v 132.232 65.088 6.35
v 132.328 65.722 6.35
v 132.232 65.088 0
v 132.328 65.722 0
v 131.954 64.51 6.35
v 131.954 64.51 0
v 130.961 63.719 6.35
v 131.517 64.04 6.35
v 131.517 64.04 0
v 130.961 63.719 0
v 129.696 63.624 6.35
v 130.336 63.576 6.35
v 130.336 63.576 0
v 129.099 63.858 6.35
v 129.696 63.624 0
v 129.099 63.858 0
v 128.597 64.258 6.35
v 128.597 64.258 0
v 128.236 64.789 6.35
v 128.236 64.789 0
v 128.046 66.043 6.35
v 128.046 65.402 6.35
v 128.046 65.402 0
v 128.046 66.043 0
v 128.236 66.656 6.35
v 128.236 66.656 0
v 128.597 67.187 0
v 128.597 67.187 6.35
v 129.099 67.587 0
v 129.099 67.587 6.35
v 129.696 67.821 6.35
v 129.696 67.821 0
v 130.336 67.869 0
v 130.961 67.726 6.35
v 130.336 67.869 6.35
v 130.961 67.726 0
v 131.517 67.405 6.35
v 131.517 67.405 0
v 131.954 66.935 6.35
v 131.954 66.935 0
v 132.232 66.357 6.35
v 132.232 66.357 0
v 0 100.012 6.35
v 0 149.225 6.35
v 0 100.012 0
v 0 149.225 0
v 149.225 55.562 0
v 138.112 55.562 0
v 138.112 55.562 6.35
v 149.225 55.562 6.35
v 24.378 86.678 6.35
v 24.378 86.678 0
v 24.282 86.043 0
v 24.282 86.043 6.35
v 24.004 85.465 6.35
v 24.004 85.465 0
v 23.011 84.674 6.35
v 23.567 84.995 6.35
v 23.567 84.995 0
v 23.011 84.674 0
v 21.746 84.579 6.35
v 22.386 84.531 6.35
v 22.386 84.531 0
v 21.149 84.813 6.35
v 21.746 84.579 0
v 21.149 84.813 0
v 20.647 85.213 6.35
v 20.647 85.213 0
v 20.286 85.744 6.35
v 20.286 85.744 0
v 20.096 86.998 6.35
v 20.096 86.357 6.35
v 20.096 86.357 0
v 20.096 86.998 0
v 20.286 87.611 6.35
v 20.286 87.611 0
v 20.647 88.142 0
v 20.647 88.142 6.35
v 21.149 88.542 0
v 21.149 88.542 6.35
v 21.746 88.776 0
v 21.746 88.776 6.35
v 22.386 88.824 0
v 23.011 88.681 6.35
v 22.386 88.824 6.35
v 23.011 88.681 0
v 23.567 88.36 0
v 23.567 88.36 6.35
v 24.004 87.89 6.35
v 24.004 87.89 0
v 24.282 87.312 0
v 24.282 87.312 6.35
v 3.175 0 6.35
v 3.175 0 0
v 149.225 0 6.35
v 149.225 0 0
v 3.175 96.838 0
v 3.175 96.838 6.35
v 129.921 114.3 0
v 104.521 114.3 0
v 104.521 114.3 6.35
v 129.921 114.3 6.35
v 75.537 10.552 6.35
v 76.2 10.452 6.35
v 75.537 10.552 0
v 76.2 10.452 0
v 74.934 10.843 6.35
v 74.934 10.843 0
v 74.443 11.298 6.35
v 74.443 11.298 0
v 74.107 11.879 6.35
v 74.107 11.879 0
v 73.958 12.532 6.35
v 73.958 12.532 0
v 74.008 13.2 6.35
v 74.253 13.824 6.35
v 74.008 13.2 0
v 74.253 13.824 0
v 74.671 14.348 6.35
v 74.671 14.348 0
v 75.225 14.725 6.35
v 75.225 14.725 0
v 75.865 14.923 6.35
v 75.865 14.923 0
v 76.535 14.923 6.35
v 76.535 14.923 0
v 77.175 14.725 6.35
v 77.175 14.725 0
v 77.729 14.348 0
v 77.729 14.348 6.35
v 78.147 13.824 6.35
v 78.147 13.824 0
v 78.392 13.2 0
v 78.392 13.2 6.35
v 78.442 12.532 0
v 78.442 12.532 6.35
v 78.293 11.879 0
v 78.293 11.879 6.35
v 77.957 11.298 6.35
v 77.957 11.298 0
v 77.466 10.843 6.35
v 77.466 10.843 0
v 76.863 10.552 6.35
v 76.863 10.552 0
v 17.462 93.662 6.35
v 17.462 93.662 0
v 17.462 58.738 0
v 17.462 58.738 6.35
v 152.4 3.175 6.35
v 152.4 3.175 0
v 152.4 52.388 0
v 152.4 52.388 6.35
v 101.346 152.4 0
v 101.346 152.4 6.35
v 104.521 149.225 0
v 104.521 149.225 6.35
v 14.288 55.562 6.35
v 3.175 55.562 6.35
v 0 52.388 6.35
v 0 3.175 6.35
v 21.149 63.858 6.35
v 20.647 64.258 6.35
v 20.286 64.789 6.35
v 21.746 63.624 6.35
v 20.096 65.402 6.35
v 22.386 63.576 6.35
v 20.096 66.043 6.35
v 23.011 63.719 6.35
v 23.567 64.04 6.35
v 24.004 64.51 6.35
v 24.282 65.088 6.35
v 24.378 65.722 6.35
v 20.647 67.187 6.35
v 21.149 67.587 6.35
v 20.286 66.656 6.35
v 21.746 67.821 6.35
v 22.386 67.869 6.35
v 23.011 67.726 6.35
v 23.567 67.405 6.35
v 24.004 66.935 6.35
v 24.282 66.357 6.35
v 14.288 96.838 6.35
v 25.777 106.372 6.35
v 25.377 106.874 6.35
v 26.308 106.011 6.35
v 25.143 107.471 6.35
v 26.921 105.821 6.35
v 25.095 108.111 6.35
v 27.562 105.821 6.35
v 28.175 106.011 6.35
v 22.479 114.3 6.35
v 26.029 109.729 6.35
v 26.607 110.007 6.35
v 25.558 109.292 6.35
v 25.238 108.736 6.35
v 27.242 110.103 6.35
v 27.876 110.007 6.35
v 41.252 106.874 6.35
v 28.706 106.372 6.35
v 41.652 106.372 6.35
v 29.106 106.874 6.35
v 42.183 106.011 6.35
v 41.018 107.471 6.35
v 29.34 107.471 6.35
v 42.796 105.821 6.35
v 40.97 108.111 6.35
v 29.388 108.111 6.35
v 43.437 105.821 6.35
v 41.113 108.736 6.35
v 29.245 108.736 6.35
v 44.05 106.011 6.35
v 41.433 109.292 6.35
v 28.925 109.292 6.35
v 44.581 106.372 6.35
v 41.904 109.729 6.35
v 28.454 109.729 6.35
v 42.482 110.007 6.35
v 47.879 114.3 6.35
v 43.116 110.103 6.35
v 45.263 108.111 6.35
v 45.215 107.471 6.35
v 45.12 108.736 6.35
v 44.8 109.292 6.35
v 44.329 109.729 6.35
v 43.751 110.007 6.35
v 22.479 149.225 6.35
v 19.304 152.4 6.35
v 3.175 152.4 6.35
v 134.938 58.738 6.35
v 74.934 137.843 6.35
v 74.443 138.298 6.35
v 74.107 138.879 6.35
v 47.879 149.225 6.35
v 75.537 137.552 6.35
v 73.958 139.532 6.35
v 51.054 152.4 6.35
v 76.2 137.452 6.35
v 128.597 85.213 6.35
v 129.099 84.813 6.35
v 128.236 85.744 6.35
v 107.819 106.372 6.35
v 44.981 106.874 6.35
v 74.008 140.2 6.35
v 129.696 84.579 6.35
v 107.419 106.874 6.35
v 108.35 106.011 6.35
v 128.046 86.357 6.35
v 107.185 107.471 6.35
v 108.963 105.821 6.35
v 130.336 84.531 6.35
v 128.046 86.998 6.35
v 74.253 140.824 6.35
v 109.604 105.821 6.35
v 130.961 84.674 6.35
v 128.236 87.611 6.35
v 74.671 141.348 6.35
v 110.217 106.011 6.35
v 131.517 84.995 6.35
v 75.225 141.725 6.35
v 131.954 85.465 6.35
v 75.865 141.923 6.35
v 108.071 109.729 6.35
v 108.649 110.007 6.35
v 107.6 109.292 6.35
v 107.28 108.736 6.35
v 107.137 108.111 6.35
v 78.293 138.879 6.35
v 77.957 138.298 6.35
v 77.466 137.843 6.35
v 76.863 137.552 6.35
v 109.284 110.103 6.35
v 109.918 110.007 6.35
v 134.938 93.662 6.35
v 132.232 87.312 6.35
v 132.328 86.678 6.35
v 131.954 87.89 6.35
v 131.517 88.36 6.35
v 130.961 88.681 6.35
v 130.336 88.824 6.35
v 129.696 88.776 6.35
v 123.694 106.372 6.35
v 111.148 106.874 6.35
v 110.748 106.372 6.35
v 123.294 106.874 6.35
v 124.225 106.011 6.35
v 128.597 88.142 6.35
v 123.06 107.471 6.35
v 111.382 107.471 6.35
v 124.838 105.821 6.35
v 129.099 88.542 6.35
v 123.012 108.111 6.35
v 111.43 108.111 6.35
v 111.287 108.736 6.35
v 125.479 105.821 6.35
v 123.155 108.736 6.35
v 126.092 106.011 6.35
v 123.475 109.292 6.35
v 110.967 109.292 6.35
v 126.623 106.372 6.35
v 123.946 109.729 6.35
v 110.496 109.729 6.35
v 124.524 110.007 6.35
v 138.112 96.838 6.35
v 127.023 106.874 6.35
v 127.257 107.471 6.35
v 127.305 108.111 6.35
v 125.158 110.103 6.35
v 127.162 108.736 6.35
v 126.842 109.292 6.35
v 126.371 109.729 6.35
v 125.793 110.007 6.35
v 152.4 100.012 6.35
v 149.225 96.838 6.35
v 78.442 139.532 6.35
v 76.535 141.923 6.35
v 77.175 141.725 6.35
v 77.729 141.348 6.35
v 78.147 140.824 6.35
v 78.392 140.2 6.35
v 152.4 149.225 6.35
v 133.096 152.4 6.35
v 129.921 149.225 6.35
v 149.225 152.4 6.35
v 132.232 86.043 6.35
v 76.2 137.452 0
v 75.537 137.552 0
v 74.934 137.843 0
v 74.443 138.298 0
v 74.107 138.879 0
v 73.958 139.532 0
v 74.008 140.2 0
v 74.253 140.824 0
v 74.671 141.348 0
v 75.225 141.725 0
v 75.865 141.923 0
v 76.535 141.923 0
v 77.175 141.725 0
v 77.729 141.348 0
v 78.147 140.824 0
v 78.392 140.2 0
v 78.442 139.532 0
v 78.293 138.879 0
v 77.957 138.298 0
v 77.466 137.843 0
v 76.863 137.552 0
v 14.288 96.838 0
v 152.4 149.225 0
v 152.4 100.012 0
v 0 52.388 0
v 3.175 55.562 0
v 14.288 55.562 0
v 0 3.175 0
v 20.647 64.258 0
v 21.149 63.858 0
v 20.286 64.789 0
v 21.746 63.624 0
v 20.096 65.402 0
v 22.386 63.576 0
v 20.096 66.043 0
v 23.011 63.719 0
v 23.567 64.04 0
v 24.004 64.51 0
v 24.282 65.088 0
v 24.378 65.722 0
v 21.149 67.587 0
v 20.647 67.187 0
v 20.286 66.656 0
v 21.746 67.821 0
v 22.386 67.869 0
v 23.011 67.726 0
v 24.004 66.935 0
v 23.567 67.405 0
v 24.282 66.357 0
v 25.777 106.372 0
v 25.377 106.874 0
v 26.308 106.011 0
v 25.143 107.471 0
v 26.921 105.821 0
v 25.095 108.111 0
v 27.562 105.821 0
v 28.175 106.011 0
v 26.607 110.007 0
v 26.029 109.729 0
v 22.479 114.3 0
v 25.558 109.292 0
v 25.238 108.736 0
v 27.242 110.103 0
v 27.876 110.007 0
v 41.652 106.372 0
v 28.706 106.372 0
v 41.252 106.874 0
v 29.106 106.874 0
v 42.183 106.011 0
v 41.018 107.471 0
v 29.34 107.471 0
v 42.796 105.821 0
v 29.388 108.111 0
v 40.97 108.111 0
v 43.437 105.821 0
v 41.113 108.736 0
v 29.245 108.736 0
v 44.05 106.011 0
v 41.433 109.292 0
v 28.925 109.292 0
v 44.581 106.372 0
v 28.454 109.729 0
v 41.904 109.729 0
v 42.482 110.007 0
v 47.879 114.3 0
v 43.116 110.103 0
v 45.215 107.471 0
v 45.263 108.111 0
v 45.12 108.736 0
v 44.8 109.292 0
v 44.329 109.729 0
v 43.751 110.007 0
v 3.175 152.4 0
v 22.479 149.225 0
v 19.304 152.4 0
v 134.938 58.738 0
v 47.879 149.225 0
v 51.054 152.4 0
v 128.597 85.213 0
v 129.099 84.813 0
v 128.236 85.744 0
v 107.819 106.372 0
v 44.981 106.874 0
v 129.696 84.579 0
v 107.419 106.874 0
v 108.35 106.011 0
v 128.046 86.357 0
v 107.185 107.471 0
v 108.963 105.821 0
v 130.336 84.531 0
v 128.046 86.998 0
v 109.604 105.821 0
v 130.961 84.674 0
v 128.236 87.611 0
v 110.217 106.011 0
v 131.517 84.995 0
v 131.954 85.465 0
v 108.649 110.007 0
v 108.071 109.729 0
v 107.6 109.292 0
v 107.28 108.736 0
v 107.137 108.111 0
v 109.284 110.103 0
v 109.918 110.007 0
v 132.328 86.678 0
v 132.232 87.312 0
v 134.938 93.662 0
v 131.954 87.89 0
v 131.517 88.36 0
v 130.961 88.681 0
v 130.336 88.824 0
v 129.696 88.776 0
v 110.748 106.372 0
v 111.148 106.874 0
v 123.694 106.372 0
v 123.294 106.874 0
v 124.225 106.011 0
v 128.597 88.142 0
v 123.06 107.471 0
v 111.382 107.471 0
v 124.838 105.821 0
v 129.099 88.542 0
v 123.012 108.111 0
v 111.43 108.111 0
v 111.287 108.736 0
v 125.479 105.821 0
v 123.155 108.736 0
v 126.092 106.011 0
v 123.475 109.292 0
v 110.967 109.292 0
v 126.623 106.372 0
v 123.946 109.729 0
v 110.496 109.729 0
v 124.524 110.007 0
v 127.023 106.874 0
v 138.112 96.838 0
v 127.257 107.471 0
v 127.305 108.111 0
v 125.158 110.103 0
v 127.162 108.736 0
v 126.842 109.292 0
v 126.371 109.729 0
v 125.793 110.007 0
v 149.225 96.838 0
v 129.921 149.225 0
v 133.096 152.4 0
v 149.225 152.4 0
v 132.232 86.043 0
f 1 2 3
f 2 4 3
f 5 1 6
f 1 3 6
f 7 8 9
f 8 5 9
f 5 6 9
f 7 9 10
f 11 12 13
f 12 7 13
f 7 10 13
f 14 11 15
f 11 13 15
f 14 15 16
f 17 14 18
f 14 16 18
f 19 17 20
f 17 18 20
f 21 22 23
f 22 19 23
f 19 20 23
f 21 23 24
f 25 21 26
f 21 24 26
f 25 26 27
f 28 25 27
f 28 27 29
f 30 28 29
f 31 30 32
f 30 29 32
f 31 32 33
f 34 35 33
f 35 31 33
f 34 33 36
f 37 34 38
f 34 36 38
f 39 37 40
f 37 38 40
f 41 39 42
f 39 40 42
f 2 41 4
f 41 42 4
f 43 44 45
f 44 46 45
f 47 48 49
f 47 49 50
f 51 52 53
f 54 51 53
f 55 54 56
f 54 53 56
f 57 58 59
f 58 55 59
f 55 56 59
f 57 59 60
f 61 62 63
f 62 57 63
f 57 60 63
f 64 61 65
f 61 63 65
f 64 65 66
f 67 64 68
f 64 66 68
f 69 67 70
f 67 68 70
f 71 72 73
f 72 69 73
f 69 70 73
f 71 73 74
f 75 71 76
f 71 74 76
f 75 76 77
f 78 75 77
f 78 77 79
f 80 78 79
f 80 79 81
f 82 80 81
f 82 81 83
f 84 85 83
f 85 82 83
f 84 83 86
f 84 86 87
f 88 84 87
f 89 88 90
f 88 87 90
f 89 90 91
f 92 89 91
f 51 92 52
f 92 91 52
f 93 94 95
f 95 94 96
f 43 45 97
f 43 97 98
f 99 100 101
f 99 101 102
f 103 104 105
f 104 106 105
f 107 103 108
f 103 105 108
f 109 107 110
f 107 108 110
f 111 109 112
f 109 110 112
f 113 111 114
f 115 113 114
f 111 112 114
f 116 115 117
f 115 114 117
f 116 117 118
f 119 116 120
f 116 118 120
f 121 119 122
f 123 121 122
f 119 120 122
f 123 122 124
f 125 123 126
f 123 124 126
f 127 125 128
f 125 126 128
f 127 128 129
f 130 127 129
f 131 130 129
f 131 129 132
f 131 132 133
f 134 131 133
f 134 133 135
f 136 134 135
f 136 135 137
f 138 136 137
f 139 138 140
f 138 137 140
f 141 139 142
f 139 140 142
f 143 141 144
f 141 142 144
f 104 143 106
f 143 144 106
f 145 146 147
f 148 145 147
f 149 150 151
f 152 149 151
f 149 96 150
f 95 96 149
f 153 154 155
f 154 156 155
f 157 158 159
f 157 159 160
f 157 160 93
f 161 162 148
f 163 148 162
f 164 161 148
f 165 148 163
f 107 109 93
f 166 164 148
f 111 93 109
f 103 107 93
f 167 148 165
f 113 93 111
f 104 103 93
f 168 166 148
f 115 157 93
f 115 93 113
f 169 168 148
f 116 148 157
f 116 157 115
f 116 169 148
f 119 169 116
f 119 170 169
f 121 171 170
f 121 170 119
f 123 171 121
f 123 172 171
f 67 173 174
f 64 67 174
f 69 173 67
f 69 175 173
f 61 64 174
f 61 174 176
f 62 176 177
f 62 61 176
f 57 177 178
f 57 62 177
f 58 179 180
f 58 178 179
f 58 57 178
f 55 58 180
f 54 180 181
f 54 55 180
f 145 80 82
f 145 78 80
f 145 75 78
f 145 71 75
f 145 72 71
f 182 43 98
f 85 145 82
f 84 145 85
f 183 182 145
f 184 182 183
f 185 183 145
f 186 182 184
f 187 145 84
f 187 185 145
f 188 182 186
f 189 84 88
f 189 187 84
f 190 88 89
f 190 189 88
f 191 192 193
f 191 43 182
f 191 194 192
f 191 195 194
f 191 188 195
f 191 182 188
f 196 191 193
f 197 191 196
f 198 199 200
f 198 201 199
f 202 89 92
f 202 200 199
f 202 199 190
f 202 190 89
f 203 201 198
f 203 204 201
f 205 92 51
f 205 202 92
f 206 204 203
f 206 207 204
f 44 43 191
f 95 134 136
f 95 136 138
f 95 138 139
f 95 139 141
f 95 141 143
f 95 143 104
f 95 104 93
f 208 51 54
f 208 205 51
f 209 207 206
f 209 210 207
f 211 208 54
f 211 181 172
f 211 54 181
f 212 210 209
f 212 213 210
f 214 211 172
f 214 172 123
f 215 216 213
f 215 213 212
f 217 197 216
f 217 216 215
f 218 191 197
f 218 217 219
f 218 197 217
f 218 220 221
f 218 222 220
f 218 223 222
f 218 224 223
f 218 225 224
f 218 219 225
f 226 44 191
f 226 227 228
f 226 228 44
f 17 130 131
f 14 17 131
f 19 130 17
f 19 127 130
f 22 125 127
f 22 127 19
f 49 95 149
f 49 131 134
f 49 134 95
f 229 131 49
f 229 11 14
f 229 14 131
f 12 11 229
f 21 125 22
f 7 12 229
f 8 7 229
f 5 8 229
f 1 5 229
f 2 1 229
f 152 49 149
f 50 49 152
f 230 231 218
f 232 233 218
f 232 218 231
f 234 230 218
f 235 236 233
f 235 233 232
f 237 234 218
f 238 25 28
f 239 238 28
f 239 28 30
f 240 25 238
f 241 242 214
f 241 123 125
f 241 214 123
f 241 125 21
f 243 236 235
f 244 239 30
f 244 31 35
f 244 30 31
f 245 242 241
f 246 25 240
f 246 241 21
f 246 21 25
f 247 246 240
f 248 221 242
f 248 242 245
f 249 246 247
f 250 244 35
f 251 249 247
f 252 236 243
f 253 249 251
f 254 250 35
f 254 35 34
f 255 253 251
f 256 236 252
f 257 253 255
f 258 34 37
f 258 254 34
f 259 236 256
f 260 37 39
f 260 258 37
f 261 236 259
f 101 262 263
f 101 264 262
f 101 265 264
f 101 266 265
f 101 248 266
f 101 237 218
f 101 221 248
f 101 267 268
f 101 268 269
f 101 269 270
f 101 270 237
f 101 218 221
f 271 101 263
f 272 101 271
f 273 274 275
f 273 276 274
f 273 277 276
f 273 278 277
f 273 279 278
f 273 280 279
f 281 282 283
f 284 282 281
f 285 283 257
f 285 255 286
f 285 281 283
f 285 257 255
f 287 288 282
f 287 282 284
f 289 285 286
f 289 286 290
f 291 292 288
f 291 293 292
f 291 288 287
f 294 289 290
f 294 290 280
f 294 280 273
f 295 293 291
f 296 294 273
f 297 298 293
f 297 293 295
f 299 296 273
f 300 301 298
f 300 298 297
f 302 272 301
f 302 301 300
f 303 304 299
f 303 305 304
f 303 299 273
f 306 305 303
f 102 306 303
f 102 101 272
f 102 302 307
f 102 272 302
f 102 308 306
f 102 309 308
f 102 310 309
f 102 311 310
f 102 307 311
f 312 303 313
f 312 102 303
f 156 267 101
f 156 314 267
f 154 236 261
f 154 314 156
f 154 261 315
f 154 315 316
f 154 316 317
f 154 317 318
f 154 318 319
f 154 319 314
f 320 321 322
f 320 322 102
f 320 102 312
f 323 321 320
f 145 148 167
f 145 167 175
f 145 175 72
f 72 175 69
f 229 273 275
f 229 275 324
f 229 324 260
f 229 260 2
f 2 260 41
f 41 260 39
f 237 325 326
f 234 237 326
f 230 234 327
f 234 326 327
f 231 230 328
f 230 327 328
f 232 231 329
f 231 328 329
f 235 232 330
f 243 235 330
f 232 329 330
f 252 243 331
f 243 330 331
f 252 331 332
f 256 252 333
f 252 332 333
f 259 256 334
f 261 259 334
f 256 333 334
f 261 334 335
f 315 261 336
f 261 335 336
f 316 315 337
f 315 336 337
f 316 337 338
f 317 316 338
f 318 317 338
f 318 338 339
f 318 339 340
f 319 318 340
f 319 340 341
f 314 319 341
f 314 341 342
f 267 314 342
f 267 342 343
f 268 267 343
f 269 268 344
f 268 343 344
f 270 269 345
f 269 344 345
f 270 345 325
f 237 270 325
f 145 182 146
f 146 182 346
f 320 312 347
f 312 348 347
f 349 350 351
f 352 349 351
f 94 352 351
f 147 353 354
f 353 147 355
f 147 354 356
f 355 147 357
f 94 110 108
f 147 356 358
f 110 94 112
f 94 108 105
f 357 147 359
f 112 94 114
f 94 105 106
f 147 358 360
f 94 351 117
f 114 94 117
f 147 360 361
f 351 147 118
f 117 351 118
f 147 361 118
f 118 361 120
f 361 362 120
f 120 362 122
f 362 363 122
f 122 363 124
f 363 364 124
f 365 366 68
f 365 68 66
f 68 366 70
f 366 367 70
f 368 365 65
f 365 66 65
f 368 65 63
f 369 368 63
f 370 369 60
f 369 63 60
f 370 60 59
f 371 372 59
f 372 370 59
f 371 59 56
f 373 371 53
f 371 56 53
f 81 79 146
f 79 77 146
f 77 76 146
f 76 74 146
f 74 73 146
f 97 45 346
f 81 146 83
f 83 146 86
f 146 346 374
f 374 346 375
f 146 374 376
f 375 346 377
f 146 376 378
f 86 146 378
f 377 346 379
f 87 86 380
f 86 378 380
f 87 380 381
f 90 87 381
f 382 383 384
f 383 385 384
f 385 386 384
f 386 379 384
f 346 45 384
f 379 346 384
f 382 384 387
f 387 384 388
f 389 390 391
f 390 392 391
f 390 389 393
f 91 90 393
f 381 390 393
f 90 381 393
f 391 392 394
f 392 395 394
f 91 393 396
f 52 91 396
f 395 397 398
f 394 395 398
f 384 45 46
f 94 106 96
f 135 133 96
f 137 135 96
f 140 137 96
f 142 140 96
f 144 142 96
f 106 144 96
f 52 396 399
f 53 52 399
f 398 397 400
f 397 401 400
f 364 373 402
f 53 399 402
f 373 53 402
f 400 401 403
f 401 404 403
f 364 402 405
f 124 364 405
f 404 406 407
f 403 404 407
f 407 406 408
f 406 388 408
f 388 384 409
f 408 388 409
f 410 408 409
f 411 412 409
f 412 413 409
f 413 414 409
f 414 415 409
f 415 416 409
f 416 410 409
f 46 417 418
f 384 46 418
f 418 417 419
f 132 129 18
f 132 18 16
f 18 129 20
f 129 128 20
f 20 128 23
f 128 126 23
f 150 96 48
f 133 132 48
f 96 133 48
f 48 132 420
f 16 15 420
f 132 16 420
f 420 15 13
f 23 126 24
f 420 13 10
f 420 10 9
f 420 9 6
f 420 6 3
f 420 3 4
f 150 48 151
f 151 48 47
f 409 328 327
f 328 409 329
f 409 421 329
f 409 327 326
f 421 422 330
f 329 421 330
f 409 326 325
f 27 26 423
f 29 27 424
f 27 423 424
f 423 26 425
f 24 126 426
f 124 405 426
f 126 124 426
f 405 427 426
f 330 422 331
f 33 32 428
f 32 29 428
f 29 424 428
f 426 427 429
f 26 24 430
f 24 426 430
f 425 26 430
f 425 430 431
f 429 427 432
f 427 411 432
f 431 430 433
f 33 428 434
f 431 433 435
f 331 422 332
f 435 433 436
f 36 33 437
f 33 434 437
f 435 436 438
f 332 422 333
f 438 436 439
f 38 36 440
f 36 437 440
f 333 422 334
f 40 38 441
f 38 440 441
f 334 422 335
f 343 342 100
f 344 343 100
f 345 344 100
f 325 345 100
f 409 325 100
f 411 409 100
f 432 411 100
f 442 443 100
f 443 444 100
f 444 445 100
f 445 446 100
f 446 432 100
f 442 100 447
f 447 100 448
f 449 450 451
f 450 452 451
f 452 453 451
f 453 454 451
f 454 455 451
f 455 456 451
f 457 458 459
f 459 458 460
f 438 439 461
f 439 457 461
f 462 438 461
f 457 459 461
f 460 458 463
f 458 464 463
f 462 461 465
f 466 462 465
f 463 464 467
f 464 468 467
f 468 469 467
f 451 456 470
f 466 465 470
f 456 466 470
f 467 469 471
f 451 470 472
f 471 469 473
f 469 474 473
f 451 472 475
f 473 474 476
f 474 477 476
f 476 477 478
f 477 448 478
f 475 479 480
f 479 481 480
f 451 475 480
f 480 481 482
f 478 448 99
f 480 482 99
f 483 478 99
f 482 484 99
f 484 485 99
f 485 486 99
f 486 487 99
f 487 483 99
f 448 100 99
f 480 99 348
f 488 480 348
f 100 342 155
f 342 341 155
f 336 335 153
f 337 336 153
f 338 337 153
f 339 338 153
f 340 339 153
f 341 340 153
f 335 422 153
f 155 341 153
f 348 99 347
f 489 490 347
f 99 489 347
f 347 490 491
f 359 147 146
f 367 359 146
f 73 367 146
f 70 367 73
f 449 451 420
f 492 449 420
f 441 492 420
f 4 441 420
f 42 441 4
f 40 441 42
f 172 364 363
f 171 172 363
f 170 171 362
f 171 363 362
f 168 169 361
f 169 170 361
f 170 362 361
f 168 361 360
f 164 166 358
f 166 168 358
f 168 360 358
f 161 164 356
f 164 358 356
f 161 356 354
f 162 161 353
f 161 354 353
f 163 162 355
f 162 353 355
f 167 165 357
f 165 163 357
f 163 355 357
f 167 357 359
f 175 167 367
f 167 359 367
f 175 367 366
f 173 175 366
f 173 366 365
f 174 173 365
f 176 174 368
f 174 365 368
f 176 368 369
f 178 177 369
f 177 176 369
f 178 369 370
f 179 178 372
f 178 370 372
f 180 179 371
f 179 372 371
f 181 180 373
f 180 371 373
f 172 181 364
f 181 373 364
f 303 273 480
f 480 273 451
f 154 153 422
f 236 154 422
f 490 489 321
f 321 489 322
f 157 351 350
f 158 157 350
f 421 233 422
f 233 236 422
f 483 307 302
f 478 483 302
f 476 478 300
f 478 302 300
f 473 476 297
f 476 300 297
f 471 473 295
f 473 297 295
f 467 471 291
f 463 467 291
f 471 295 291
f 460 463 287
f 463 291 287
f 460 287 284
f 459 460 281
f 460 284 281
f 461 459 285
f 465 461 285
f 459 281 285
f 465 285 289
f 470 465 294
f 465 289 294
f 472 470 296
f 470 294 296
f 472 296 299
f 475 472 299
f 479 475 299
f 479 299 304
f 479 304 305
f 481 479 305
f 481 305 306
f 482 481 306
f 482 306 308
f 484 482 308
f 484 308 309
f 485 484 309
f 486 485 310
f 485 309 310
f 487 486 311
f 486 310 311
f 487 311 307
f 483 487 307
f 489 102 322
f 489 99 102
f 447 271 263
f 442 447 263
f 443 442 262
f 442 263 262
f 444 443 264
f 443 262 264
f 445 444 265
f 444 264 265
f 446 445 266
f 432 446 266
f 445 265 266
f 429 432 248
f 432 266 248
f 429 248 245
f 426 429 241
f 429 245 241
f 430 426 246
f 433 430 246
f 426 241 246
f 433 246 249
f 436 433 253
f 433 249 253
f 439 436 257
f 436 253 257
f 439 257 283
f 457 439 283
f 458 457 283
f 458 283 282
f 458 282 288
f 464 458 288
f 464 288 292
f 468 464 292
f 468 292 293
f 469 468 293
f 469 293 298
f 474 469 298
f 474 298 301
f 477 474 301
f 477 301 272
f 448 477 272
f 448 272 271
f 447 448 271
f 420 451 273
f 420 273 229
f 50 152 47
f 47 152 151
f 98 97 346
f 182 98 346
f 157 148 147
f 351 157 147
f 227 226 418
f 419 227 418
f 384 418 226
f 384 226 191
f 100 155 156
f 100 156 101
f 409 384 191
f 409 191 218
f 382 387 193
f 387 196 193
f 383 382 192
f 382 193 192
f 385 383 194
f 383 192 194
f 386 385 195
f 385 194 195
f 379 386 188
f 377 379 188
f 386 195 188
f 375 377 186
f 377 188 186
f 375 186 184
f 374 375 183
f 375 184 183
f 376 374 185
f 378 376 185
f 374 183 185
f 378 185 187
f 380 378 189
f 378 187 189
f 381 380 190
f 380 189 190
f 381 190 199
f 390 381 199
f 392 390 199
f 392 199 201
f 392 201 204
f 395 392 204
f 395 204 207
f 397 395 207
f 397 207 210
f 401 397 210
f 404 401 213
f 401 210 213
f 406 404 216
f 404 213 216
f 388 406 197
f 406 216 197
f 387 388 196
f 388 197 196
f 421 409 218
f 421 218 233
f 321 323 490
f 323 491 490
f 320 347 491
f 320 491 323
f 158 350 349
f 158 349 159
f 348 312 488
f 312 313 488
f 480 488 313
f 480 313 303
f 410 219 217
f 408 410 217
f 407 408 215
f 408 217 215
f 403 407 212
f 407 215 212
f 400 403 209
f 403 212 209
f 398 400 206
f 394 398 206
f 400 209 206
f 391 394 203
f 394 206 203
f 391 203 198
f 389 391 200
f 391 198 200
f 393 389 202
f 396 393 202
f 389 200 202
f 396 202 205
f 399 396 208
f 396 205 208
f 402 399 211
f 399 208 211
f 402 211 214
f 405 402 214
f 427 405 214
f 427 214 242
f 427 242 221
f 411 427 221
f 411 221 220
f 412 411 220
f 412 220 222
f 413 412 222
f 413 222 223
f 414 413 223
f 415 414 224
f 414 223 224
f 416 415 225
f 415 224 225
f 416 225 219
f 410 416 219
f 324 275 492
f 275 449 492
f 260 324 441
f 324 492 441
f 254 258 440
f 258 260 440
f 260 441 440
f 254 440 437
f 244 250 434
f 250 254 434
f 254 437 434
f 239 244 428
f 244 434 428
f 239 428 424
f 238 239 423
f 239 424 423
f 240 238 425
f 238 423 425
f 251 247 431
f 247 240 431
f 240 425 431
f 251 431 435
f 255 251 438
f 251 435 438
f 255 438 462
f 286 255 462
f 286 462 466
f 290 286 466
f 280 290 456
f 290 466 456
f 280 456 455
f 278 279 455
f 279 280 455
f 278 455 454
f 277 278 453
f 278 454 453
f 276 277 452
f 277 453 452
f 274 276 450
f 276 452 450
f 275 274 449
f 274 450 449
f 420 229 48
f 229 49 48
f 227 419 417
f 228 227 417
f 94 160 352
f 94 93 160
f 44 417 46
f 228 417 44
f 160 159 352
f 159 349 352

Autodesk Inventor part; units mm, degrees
ref_plane "YZ Plane" through (0, 0, 0) normal (1, 0, 0) x (0, 1, 0)
ref_plane "XZ Plane" through (0, 0, 0) normal (0, 1, 0) x (-1, 0, 0)
ref_plane "XY Plane" through (0, 0, 0) normal (0, 0, 1) x (1, 0, 0)
sketch "Sketch1" plane through (0, 0, 0) normal (0, 0, 1) x (1, 0, 0)
  line L0 (0, 0) -> (152.4, 0)
  line L1 (152.4, 96.8375) -> (134.9375, 96.8375)
  line L2 (134.9375, 96.8375) -> (134.9375, 55.5625)
  line L3 (134.9375, 55.5625) -> (152.4, 55.5625)
  line L4 (0, 96.8375) -> (17.4625, 96.8375)
  line L5 (17.4625, 96.8375) -> (17.4625, 55.5625)
  line L6 (17.4625, 55.5625) -> (0, 55.5625)
  line L7 (152.4, 0) -> (152.4, 55.5625)
  line L8 (152.4, 96.8375) -> (152.4, 152.4)
  line L9 (0, 152.4) -> (0, 96.8375)
  line L10 (0, 55.5625) -> (0, 0)
  circle A0 centre (22.225, 86.6775) radius 2.1526
  circle A1 centre (22.225, 65.7225) radius 2.1526
  circle A2 centre (130.175, 86.6775) radius 2.1526
  circle A3 centre (130.175, 65.7225) radius 2.1526
  line L11 (22.479, 152.4) -> (22.479, 114.3)
  line L12 (22.479, 114.3) -> (47.879, 114.3)
  line L13 (47.879, 114.3) -> (47.879, 152.4)
  line L14 (104.521, 152.4) -> (104.521, 114.3)
  line L15 (104.521, 114.3) -> (129.921, 114.3)
  line L16 (129.921, 114.3) -> (129.921, 152.4)
  line L17 (22.479, 152.4) -> (0, 152.4)
  line L18 (152.4, 152.4) -> (129.921, 152.4)
  line L19 (104.521, 152.4) -> (47.879, 152.4)
  dimension "d0" = 152.4
  dimension "d1" = 152.4
  dimension "d2" = 41.275
  dimension "d3" = 55.5625
  dimension "d4" = 17.4625
  dimension "d5" = 41.275
  dimension "d6" = 17.4625
  dimension "d7" = 55.5625
  dimension "d8" = 152.4
  dimension "d10" = 4.3053
  dimension "d11" = 4.3053
  dimension "d12" = 4.3053
  dimension "d13" = 4.3053
  dimension "d15" = 22.225
  dimension "d16" = 22.225
  dimension "d17" = 22.225
  dimension "d18" = 22.225
  dimension "d19" = 10.16
  dimension "d20" = 10.16
  dimension "d21" = 10.16
  dimension "d22" = 10.16
  dimension "d28" = 107.442
  dimension "d29" = 25.4
  dimension "d30" = 25.4
  dimension "d31" = 22.479
  dimension "d32" = 38.1
extrude "Extrusion1" add sketch "Sketch1" along normal blind 6.35
chamfer "Chamfer1" distance 3.175 angle 45 12 edges at (0, 55.5625, 3.175) (17.4625, 55.5625, 3.175) (17.4625, 96.8375, 3.175) (0, 96.8375, 3.175) (152.4, 55.5625, 3.175) (134.9375, 55.5625, 3.175) (134.9375, 96.8375, 3.175) (152.4, 96.8375, 3.175) (152.4, 0, 3.175) (0, 0, 3.175) (0, 152.4, 3.175) (152.4, 152.4, 3.175)
chamfer "Chamfer2" distance 3.175 angle 45 4 edges at (22.479, 152.4, 3.175) (47.879, 152.4, 3.175) (104.521, 152.4, 3.175) (129.921, 152.4, 3.175)
sketch "Sketch2" plane through (0, 0, 0) normal (0, 0, -1) x (-1, 0, 0)
  line L0 (-22.479, 114.3) -> (-22.479, 149.225) projected
  line L1 (-129.921, 114.3) -> (-104.521, 114.3) projected
  line L2 (-129.921, 149.225) -> (-129.921, 114.3) projected
  line L3 (-125.1585, 107.95) -> (-27.2415, 107.95) construction
  point P0 (0, 0)
  point P1 (-109.2835, 107.95)
  point P2 (-43.1165, 107.95)
  dimension "d37" = 15.875
  dimension "d39" = 15.875
  dimension "d40" = 4.7625
  dimension "d41" = 4.7625
  dimension "d42" = 6.35
hole "Hole1" at (109.2835, 107.95, 0) at (43.1165, 107.95, 0) at (27.2415, 107.95, 0) at (125.1585, 107.95, 0) direction (0, 0, 1) diameter 4.3053 end through all
sketch "Sketch3" plane through (0, 0, 6.35) normal (0, 0, 1) x (1, 0, 0)
  line L0 (101.346, 152.4) -> (51.054, 152.4) projected
  line L1 (3.175, 0) -> (149.225, 0) projected
  point P0 (0, 0)
  point P1 (76.2, 139.7)
  point P2 (76.2, 12.7)
  dimension "d50" = 76.2
  dimension "d51" = 76.2
  dimension "d52" = 12.7
  dimension "d53" = 12.7
hole "Hole2" at (76.2, 139.7, 6.35) at (76.2, 12.7, 6.35) direction (0, 0, -1) diameter 4.4958 end through all
equation "\"d31\" = -0.5 * d28 + 0.5 * d0"
equation "\"d41\" = d40"
properties part number "base"
